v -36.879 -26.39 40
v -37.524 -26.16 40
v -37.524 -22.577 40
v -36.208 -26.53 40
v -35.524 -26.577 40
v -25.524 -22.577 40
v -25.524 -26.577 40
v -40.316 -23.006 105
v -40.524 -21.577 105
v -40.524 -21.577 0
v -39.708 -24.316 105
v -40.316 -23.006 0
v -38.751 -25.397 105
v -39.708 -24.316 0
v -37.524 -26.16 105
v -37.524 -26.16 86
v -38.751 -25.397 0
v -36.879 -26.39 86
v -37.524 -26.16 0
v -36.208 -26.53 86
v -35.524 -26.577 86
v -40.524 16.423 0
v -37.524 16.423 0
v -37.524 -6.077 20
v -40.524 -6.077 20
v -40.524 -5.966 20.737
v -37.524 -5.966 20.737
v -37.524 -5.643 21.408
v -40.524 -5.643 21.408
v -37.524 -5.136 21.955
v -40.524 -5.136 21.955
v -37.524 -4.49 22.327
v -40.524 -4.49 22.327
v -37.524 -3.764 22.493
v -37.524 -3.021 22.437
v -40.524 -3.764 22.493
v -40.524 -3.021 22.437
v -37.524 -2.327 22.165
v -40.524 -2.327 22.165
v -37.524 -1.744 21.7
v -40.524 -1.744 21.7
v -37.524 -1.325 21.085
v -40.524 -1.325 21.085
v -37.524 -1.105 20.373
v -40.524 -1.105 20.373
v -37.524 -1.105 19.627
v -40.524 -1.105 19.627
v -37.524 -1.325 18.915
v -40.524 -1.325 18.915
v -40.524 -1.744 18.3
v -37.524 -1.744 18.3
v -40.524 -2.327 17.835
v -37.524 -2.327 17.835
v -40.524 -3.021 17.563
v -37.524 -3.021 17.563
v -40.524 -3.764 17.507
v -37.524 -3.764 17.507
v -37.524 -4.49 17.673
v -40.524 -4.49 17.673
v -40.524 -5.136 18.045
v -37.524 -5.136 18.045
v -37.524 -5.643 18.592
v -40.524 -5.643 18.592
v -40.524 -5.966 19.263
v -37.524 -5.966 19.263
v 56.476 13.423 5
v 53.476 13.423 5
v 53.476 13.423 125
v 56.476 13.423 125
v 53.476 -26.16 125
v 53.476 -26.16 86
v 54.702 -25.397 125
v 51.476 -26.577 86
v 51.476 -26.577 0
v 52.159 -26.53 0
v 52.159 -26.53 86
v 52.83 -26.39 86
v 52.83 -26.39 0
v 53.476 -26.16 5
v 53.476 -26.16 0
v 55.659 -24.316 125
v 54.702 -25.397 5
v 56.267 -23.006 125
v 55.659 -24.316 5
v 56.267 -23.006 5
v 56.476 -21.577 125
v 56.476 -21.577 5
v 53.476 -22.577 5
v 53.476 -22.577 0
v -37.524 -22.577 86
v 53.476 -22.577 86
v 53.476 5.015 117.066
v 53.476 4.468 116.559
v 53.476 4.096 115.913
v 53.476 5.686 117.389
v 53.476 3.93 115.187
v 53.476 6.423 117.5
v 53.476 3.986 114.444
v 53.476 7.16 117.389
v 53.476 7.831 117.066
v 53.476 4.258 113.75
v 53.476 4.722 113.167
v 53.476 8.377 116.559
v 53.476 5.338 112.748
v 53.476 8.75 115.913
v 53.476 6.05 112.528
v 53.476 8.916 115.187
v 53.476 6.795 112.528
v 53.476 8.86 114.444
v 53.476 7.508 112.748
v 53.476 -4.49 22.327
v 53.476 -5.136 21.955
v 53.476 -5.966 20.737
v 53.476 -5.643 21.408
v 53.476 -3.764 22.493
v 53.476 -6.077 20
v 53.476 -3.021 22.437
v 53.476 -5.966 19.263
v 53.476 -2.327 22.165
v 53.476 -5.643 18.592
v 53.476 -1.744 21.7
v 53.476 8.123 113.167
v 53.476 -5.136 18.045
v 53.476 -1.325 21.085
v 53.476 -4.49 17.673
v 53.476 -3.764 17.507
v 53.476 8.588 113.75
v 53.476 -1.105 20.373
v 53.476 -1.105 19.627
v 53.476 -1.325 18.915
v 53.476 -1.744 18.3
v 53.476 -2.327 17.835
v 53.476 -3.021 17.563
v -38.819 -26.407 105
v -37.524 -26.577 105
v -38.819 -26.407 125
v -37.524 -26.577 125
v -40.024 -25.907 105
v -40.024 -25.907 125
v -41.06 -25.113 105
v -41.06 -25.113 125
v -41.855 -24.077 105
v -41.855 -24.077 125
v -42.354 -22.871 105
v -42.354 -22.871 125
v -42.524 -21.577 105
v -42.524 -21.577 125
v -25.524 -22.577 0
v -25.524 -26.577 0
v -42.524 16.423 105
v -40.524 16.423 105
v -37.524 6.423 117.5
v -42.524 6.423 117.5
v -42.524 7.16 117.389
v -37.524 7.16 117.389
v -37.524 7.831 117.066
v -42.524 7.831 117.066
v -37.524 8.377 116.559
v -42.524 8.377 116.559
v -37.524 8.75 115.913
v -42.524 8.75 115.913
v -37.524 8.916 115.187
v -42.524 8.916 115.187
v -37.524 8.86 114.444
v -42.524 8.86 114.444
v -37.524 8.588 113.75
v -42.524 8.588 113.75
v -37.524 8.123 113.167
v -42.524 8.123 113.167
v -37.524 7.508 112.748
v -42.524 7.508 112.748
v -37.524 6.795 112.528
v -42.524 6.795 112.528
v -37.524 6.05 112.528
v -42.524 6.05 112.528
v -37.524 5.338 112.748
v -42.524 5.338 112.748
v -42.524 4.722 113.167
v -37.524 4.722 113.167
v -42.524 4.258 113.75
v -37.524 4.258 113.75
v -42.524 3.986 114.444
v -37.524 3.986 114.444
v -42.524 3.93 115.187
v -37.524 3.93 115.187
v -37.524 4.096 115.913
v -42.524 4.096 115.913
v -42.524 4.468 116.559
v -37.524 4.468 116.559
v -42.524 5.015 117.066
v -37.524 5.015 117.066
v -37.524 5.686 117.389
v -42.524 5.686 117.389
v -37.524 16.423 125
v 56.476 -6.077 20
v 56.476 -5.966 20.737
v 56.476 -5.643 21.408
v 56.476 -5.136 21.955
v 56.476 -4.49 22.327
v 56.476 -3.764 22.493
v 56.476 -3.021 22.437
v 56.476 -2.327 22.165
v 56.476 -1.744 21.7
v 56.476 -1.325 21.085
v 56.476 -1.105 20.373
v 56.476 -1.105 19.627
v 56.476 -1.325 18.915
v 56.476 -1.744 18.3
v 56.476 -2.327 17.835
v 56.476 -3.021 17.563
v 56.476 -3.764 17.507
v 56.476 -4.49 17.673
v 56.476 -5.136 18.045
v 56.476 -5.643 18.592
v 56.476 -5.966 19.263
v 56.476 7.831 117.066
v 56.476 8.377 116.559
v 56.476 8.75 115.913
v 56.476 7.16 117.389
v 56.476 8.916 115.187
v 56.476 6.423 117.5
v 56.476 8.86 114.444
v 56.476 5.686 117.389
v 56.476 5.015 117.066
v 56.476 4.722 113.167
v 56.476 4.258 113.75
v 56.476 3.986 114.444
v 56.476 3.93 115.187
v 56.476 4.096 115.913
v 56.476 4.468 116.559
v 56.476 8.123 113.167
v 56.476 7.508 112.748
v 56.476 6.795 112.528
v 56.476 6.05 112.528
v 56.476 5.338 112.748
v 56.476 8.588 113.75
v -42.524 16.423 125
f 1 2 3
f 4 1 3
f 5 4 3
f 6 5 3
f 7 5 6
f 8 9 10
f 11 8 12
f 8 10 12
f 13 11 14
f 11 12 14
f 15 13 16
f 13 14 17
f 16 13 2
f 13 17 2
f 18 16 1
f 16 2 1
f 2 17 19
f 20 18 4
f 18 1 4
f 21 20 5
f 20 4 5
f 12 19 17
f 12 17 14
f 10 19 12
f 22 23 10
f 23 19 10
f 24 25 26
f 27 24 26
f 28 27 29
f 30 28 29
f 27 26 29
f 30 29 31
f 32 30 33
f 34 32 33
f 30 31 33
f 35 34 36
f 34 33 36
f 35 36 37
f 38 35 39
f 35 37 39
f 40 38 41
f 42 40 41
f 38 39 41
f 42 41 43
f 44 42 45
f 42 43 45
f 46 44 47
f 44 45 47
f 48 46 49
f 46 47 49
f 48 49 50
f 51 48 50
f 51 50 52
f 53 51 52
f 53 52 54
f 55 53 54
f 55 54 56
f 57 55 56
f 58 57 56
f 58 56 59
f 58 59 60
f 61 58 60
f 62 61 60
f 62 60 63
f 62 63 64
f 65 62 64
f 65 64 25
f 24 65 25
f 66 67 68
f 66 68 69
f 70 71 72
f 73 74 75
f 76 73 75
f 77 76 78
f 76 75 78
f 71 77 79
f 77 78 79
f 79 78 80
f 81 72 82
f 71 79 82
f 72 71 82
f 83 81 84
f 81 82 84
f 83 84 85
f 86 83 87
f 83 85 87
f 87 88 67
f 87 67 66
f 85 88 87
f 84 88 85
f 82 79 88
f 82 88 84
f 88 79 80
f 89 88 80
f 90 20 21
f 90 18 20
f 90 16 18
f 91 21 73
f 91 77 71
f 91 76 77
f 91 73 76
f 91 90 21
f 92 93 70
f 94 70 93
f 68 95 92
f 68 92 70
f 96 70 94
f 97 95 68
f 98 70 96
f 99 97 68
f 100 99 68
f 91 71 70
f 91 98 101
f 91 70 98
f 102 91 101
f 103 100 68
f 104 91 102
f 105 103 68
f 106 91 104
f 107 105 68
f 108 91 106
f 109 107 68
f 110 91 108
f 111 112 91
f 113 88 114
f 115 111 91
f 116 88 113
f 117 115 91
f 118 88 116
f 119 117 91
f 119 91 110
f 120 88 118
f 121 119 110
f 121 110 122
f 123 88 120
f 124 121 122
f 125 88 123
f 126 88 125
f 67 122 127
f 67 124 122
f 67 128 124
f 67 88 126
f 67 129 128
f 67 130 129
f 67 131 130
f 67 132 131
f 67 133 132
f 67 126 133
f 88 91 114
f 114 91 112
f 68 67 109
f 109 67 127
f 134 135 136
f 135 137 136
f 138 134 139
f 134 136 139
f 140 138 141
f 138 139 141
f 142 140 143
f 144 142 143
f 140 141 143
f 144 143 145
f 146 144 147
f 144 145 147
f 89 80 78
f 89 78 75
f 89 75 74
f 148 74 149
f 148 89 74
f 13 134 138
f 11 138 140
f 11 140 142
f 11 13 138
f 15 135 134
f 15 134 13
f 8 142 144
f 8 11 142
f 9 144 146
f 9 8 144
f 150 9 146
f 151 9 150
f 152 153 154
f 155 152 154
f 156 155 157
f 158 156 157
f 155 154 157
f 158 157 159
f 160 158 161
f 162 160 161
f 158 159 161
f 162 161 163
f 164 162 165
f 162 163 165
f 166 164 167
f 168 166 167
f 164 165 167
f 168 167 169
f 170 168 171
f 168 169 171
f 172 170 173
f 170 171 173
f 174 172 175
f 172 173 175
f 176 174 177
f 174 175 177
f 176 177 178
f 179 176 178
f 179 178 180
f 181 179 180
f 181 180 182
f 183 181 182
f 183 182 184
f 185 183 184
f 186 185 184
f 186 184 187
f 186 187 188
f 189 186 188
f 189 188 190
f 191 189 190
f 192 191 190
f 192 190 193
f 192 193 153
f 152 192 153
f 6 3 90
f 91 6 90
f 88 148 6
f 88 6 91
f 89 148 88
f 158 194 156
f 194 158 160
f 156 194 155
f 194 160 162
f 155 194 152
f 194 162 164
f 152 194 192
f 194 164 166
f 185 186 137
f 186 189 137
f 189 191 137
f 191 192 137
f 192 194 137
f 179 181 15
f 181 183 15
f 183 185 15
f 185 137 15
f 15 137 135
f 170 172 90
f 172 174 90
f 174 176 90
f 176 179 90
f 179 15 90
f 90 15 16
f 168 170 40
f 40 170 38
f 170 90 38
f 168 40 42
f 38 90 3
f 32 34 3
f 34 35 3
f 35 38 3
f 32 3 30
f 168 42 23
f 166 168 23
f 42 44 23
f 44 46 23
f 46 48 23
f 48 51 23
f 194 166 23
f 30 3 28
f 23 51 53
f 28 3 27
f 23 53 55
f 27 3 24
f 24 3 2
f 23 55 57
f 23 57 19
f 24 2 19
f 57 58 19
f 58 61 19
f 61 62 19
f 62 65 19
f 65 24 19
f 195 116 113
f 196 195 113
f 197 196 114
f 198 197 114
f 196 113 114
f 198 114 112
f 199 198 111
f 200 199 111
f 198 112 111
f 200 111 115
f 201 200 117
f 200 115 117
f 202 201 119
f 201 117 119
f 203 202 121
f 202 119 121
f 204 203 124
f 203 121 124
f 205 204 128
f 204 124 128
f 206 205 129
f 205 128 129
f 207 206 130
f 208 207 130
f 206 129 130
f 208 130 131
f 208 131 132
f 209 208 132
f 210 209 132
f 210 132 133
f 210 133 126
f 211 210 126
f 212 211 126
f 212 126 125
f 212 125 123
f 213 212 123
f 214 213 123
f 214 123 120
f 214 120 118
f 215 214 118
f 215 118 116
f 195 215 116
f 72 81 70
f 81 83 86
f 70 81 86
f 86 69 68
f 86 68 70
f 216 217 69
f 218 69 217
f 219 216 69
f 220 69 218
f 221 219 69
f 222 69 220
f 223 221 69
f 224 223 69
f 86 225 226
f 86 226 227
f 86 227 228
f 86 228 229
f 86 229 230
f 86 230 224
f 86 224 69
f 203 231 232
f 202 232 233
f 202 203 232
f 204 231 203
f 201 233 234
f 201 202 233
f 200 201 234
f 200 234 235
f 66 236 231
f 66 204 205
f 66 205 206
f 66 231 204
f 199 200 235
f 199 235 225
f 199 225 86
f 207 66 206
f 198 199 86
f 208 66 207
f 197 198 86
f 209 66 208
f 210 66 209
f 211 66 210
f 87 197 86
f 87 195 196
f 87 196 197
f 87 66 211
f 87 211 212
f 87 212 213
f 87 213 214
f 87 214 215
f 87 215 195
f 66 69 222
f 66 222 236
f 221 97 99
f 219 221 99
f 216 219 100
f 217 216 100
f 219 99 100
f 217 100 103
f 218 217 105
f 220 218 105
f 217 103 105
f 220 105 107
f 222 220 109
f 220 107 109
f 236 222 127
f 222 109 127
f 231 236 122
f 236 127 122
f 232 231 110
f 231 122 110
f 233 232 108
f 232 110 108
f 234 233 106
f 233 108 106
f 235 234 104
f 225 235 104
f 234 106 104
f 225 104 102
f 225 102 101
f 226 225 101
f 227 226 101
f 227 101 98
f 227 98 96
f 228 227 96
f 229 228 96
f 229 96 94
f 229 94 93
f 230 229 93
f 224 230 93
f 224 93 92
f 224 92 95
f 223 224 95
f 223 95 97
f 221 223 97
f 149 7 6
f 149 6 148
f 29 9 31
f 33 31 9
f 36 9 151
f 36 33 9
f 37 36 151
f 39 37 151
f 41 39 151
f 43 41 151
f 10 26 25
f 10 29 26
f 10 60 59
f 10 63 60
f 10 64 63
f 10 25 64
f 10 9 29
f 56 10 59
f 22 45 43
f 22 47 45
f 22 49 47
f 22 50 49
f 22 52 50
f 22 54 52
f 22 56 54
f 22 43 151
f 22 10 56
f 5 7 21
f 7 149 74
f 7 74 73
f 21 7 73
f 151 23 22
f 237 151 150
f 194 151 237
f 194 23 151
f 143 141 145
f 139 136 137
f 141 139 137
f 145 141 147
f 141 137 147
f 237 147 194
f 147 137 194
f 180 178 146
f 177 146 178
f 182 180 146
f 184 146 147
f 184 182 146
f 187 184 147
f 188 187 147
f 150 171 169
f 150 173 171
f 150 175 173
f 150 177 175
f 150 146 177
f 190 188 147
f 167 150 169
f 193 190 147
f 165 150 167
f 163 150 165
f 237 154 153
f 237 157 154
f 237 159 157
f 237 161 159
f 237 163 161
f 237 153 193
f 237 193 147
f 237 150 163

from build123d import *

# Parameters (mm, degrees)
SALIENTE_EXTRUIR1_DEPTH    = 125
CORTAR_EXTRUIR1_DEPTH      = 125
CORTAR_EXTRUIR1_DEPTH_BACK = 125
CROQUIS3_W                 = 4
CROQUIS3_H                 = 5
CROQUIS3_W_2               = 12
CROQUIS3_H_2               = 40
CROQUIS4_W                 = 91
CROQUIS4_H                 = 39
CORTAR_EXTRUIR2_DEPTH      = 125
CROQUIS5_W                 = 20
CROQUIS5_H                 = 43
SALIENTE_EXTRUIR2_DEPTH    = 2
CROQUIS6_R                 = 2.5
CORTAR_EXTRUIR3_DEPTH      = 124
CROQUIS7_R                 = 2.5
CORTAR_EXTRUIR4_DEPTH      = 124
REDONDEO1_R                = 5
REDONDEO2_R                = 5


# Some blends are built 0.0001 mm under size
with BuildPart() as part:
    # Croquis2 → Saliente-Extruir1 (new body)
    with BuildSketch(Plane.XY):
        Polygon((56.475617161, 13.42287234), (56.475617161, -26.57712766), (-40.524382839, -26.57712766), (-40.524382839, 16.42287234), (-37.524382839, 16.42287234), (-37.524382839, -22.57712766), (53.475617161, -22.57712766), (53.475617161, 13.42287234), align=None)
    extrude(amount=SALIENTE_EXTRUIR1_DEPTH)

    # Croquis3 → Cortar-Extruir1 (cut, two sides: drawn at the far end of the back side and taken through both)
    with BuildSketch(Plane(origin=(0, -22.57712766, 0), x_dir=(1, 0, 0), z_dir=(0, 1, 0)).offset(-CORTAR_EXTRUIR1_DEPTH_BACK)):
        with Locations((55.475617161, -2.5)):
            Rectangle(CROQUIS3_W, CROQUIS3_H)
        with Locations((-31.524382839, -20)):
            Rectangle(CROQUIS3_W_2, CROQUIS3_H_2)
    extrude(amount=CORTAR_EXTRUIR1_DEPTH + CORTAR_EXTRUIR1_DEPTH_BACK, mode=Mode.SUBTRACT)

    # Croquis4 → Cortar-Extruir2 (cut)
    with BuildSketch(Plane(origin=(0, -22.57712766, 0), x_dir=(1, 0, 0), z_dir=(0, 1, 0))):
        with Locations((7.975617161, -105.5)):
            Rectangle(CROQUIS4_W, CROQUIS4_H)
    extrude(amount=-CORTAR_EXTRUIR2_DEPTH, mode=Mode.SUBTRACT)

    # Croquis5 → Saliente-Extruir2 (add)
    with BuildSketch(Plane.ZY.offset(40.524382839)):
        with Locations((115, -5.07712766)):
            Rectangle(CROQUIS5_W, CROQUIS5_H)
    extrude(amount=SALIENTE_EXTRUIR2_DEPTH)

    # Croquis6 → Cortar-Extruir3 (cut)
    with BuildSketch(Plane.ZY.offset(40.524382839)):
        with Locations(Location((20, -3.57712766, 0), (0, 0, 270))):
            Circle(CROQUIS6_R)
    extrude(amount=-CORTAR_EXTRUIR3_DEPTH, mode=Mode.SUBTRACT)

    # Croquis7 → Cortar-Extruir4 (cut)
    with BuildSketch(Plane.ZY.offset(42.524382839)):
        with Locations((115, 6.42287234)):
            Circle(CROQUIS7_R)
    extrude(amount=-CORTAR_EXTRUIR4_DEPTH, mode=Mode.SUBTRACT)

    # Redondeo1
    # the kernel refuses this fillet: 5 mm, written as the material it takes off along each edge
    with BuildSketch(Plane(origin=(56.475617161, -26.57712766, -7.5), x_dir=(0, 1, 0), z_dir=(0, 0, 1))) as redondeo1_piece_1:
        with BuildLine():
            CenterArc((REDONDEO1_R, REDONDEO1_R), REDONDEO1_R, 180, 90)
            Line((0, REDONDEO1_R), (0, 0))
            Line((0, 0), (REDONDEO1_R, 0))
        make_face()
    extrude(amount=145, mode=Mode.SUBTRACT)
    with BuildSketch(Plane(origin=(-40.524382839, -26.57712766, -12.5), x_dir=(1, 0, 0), z_dir=(0, 0, 1))) as redondeo1_piece_2:
        with BuildLine():
            CenterArc((REDONDEO1_R, REDONDEO1_R), REDONDEO1_R, 180, 90)
            Line((0, REDONDEO1_R), (0, 0))
            Line((0, 0), (REDONDEO1_R, 0))
        make_face()
    extrude(amount=117.5, mode=Mode.SUBTRACT)

    # Redondeo2
    redondeo2_edges = [part.edges().sort_by_distance(p)[0] for p in [
        (-42.524382839, -26.57712766, 115),
    ]]
    fillet(redondeo2_edges, radius=REDONDEO2_R - 0.0001)  # a hair under: the kernel refuses the full size


solid = part.part
